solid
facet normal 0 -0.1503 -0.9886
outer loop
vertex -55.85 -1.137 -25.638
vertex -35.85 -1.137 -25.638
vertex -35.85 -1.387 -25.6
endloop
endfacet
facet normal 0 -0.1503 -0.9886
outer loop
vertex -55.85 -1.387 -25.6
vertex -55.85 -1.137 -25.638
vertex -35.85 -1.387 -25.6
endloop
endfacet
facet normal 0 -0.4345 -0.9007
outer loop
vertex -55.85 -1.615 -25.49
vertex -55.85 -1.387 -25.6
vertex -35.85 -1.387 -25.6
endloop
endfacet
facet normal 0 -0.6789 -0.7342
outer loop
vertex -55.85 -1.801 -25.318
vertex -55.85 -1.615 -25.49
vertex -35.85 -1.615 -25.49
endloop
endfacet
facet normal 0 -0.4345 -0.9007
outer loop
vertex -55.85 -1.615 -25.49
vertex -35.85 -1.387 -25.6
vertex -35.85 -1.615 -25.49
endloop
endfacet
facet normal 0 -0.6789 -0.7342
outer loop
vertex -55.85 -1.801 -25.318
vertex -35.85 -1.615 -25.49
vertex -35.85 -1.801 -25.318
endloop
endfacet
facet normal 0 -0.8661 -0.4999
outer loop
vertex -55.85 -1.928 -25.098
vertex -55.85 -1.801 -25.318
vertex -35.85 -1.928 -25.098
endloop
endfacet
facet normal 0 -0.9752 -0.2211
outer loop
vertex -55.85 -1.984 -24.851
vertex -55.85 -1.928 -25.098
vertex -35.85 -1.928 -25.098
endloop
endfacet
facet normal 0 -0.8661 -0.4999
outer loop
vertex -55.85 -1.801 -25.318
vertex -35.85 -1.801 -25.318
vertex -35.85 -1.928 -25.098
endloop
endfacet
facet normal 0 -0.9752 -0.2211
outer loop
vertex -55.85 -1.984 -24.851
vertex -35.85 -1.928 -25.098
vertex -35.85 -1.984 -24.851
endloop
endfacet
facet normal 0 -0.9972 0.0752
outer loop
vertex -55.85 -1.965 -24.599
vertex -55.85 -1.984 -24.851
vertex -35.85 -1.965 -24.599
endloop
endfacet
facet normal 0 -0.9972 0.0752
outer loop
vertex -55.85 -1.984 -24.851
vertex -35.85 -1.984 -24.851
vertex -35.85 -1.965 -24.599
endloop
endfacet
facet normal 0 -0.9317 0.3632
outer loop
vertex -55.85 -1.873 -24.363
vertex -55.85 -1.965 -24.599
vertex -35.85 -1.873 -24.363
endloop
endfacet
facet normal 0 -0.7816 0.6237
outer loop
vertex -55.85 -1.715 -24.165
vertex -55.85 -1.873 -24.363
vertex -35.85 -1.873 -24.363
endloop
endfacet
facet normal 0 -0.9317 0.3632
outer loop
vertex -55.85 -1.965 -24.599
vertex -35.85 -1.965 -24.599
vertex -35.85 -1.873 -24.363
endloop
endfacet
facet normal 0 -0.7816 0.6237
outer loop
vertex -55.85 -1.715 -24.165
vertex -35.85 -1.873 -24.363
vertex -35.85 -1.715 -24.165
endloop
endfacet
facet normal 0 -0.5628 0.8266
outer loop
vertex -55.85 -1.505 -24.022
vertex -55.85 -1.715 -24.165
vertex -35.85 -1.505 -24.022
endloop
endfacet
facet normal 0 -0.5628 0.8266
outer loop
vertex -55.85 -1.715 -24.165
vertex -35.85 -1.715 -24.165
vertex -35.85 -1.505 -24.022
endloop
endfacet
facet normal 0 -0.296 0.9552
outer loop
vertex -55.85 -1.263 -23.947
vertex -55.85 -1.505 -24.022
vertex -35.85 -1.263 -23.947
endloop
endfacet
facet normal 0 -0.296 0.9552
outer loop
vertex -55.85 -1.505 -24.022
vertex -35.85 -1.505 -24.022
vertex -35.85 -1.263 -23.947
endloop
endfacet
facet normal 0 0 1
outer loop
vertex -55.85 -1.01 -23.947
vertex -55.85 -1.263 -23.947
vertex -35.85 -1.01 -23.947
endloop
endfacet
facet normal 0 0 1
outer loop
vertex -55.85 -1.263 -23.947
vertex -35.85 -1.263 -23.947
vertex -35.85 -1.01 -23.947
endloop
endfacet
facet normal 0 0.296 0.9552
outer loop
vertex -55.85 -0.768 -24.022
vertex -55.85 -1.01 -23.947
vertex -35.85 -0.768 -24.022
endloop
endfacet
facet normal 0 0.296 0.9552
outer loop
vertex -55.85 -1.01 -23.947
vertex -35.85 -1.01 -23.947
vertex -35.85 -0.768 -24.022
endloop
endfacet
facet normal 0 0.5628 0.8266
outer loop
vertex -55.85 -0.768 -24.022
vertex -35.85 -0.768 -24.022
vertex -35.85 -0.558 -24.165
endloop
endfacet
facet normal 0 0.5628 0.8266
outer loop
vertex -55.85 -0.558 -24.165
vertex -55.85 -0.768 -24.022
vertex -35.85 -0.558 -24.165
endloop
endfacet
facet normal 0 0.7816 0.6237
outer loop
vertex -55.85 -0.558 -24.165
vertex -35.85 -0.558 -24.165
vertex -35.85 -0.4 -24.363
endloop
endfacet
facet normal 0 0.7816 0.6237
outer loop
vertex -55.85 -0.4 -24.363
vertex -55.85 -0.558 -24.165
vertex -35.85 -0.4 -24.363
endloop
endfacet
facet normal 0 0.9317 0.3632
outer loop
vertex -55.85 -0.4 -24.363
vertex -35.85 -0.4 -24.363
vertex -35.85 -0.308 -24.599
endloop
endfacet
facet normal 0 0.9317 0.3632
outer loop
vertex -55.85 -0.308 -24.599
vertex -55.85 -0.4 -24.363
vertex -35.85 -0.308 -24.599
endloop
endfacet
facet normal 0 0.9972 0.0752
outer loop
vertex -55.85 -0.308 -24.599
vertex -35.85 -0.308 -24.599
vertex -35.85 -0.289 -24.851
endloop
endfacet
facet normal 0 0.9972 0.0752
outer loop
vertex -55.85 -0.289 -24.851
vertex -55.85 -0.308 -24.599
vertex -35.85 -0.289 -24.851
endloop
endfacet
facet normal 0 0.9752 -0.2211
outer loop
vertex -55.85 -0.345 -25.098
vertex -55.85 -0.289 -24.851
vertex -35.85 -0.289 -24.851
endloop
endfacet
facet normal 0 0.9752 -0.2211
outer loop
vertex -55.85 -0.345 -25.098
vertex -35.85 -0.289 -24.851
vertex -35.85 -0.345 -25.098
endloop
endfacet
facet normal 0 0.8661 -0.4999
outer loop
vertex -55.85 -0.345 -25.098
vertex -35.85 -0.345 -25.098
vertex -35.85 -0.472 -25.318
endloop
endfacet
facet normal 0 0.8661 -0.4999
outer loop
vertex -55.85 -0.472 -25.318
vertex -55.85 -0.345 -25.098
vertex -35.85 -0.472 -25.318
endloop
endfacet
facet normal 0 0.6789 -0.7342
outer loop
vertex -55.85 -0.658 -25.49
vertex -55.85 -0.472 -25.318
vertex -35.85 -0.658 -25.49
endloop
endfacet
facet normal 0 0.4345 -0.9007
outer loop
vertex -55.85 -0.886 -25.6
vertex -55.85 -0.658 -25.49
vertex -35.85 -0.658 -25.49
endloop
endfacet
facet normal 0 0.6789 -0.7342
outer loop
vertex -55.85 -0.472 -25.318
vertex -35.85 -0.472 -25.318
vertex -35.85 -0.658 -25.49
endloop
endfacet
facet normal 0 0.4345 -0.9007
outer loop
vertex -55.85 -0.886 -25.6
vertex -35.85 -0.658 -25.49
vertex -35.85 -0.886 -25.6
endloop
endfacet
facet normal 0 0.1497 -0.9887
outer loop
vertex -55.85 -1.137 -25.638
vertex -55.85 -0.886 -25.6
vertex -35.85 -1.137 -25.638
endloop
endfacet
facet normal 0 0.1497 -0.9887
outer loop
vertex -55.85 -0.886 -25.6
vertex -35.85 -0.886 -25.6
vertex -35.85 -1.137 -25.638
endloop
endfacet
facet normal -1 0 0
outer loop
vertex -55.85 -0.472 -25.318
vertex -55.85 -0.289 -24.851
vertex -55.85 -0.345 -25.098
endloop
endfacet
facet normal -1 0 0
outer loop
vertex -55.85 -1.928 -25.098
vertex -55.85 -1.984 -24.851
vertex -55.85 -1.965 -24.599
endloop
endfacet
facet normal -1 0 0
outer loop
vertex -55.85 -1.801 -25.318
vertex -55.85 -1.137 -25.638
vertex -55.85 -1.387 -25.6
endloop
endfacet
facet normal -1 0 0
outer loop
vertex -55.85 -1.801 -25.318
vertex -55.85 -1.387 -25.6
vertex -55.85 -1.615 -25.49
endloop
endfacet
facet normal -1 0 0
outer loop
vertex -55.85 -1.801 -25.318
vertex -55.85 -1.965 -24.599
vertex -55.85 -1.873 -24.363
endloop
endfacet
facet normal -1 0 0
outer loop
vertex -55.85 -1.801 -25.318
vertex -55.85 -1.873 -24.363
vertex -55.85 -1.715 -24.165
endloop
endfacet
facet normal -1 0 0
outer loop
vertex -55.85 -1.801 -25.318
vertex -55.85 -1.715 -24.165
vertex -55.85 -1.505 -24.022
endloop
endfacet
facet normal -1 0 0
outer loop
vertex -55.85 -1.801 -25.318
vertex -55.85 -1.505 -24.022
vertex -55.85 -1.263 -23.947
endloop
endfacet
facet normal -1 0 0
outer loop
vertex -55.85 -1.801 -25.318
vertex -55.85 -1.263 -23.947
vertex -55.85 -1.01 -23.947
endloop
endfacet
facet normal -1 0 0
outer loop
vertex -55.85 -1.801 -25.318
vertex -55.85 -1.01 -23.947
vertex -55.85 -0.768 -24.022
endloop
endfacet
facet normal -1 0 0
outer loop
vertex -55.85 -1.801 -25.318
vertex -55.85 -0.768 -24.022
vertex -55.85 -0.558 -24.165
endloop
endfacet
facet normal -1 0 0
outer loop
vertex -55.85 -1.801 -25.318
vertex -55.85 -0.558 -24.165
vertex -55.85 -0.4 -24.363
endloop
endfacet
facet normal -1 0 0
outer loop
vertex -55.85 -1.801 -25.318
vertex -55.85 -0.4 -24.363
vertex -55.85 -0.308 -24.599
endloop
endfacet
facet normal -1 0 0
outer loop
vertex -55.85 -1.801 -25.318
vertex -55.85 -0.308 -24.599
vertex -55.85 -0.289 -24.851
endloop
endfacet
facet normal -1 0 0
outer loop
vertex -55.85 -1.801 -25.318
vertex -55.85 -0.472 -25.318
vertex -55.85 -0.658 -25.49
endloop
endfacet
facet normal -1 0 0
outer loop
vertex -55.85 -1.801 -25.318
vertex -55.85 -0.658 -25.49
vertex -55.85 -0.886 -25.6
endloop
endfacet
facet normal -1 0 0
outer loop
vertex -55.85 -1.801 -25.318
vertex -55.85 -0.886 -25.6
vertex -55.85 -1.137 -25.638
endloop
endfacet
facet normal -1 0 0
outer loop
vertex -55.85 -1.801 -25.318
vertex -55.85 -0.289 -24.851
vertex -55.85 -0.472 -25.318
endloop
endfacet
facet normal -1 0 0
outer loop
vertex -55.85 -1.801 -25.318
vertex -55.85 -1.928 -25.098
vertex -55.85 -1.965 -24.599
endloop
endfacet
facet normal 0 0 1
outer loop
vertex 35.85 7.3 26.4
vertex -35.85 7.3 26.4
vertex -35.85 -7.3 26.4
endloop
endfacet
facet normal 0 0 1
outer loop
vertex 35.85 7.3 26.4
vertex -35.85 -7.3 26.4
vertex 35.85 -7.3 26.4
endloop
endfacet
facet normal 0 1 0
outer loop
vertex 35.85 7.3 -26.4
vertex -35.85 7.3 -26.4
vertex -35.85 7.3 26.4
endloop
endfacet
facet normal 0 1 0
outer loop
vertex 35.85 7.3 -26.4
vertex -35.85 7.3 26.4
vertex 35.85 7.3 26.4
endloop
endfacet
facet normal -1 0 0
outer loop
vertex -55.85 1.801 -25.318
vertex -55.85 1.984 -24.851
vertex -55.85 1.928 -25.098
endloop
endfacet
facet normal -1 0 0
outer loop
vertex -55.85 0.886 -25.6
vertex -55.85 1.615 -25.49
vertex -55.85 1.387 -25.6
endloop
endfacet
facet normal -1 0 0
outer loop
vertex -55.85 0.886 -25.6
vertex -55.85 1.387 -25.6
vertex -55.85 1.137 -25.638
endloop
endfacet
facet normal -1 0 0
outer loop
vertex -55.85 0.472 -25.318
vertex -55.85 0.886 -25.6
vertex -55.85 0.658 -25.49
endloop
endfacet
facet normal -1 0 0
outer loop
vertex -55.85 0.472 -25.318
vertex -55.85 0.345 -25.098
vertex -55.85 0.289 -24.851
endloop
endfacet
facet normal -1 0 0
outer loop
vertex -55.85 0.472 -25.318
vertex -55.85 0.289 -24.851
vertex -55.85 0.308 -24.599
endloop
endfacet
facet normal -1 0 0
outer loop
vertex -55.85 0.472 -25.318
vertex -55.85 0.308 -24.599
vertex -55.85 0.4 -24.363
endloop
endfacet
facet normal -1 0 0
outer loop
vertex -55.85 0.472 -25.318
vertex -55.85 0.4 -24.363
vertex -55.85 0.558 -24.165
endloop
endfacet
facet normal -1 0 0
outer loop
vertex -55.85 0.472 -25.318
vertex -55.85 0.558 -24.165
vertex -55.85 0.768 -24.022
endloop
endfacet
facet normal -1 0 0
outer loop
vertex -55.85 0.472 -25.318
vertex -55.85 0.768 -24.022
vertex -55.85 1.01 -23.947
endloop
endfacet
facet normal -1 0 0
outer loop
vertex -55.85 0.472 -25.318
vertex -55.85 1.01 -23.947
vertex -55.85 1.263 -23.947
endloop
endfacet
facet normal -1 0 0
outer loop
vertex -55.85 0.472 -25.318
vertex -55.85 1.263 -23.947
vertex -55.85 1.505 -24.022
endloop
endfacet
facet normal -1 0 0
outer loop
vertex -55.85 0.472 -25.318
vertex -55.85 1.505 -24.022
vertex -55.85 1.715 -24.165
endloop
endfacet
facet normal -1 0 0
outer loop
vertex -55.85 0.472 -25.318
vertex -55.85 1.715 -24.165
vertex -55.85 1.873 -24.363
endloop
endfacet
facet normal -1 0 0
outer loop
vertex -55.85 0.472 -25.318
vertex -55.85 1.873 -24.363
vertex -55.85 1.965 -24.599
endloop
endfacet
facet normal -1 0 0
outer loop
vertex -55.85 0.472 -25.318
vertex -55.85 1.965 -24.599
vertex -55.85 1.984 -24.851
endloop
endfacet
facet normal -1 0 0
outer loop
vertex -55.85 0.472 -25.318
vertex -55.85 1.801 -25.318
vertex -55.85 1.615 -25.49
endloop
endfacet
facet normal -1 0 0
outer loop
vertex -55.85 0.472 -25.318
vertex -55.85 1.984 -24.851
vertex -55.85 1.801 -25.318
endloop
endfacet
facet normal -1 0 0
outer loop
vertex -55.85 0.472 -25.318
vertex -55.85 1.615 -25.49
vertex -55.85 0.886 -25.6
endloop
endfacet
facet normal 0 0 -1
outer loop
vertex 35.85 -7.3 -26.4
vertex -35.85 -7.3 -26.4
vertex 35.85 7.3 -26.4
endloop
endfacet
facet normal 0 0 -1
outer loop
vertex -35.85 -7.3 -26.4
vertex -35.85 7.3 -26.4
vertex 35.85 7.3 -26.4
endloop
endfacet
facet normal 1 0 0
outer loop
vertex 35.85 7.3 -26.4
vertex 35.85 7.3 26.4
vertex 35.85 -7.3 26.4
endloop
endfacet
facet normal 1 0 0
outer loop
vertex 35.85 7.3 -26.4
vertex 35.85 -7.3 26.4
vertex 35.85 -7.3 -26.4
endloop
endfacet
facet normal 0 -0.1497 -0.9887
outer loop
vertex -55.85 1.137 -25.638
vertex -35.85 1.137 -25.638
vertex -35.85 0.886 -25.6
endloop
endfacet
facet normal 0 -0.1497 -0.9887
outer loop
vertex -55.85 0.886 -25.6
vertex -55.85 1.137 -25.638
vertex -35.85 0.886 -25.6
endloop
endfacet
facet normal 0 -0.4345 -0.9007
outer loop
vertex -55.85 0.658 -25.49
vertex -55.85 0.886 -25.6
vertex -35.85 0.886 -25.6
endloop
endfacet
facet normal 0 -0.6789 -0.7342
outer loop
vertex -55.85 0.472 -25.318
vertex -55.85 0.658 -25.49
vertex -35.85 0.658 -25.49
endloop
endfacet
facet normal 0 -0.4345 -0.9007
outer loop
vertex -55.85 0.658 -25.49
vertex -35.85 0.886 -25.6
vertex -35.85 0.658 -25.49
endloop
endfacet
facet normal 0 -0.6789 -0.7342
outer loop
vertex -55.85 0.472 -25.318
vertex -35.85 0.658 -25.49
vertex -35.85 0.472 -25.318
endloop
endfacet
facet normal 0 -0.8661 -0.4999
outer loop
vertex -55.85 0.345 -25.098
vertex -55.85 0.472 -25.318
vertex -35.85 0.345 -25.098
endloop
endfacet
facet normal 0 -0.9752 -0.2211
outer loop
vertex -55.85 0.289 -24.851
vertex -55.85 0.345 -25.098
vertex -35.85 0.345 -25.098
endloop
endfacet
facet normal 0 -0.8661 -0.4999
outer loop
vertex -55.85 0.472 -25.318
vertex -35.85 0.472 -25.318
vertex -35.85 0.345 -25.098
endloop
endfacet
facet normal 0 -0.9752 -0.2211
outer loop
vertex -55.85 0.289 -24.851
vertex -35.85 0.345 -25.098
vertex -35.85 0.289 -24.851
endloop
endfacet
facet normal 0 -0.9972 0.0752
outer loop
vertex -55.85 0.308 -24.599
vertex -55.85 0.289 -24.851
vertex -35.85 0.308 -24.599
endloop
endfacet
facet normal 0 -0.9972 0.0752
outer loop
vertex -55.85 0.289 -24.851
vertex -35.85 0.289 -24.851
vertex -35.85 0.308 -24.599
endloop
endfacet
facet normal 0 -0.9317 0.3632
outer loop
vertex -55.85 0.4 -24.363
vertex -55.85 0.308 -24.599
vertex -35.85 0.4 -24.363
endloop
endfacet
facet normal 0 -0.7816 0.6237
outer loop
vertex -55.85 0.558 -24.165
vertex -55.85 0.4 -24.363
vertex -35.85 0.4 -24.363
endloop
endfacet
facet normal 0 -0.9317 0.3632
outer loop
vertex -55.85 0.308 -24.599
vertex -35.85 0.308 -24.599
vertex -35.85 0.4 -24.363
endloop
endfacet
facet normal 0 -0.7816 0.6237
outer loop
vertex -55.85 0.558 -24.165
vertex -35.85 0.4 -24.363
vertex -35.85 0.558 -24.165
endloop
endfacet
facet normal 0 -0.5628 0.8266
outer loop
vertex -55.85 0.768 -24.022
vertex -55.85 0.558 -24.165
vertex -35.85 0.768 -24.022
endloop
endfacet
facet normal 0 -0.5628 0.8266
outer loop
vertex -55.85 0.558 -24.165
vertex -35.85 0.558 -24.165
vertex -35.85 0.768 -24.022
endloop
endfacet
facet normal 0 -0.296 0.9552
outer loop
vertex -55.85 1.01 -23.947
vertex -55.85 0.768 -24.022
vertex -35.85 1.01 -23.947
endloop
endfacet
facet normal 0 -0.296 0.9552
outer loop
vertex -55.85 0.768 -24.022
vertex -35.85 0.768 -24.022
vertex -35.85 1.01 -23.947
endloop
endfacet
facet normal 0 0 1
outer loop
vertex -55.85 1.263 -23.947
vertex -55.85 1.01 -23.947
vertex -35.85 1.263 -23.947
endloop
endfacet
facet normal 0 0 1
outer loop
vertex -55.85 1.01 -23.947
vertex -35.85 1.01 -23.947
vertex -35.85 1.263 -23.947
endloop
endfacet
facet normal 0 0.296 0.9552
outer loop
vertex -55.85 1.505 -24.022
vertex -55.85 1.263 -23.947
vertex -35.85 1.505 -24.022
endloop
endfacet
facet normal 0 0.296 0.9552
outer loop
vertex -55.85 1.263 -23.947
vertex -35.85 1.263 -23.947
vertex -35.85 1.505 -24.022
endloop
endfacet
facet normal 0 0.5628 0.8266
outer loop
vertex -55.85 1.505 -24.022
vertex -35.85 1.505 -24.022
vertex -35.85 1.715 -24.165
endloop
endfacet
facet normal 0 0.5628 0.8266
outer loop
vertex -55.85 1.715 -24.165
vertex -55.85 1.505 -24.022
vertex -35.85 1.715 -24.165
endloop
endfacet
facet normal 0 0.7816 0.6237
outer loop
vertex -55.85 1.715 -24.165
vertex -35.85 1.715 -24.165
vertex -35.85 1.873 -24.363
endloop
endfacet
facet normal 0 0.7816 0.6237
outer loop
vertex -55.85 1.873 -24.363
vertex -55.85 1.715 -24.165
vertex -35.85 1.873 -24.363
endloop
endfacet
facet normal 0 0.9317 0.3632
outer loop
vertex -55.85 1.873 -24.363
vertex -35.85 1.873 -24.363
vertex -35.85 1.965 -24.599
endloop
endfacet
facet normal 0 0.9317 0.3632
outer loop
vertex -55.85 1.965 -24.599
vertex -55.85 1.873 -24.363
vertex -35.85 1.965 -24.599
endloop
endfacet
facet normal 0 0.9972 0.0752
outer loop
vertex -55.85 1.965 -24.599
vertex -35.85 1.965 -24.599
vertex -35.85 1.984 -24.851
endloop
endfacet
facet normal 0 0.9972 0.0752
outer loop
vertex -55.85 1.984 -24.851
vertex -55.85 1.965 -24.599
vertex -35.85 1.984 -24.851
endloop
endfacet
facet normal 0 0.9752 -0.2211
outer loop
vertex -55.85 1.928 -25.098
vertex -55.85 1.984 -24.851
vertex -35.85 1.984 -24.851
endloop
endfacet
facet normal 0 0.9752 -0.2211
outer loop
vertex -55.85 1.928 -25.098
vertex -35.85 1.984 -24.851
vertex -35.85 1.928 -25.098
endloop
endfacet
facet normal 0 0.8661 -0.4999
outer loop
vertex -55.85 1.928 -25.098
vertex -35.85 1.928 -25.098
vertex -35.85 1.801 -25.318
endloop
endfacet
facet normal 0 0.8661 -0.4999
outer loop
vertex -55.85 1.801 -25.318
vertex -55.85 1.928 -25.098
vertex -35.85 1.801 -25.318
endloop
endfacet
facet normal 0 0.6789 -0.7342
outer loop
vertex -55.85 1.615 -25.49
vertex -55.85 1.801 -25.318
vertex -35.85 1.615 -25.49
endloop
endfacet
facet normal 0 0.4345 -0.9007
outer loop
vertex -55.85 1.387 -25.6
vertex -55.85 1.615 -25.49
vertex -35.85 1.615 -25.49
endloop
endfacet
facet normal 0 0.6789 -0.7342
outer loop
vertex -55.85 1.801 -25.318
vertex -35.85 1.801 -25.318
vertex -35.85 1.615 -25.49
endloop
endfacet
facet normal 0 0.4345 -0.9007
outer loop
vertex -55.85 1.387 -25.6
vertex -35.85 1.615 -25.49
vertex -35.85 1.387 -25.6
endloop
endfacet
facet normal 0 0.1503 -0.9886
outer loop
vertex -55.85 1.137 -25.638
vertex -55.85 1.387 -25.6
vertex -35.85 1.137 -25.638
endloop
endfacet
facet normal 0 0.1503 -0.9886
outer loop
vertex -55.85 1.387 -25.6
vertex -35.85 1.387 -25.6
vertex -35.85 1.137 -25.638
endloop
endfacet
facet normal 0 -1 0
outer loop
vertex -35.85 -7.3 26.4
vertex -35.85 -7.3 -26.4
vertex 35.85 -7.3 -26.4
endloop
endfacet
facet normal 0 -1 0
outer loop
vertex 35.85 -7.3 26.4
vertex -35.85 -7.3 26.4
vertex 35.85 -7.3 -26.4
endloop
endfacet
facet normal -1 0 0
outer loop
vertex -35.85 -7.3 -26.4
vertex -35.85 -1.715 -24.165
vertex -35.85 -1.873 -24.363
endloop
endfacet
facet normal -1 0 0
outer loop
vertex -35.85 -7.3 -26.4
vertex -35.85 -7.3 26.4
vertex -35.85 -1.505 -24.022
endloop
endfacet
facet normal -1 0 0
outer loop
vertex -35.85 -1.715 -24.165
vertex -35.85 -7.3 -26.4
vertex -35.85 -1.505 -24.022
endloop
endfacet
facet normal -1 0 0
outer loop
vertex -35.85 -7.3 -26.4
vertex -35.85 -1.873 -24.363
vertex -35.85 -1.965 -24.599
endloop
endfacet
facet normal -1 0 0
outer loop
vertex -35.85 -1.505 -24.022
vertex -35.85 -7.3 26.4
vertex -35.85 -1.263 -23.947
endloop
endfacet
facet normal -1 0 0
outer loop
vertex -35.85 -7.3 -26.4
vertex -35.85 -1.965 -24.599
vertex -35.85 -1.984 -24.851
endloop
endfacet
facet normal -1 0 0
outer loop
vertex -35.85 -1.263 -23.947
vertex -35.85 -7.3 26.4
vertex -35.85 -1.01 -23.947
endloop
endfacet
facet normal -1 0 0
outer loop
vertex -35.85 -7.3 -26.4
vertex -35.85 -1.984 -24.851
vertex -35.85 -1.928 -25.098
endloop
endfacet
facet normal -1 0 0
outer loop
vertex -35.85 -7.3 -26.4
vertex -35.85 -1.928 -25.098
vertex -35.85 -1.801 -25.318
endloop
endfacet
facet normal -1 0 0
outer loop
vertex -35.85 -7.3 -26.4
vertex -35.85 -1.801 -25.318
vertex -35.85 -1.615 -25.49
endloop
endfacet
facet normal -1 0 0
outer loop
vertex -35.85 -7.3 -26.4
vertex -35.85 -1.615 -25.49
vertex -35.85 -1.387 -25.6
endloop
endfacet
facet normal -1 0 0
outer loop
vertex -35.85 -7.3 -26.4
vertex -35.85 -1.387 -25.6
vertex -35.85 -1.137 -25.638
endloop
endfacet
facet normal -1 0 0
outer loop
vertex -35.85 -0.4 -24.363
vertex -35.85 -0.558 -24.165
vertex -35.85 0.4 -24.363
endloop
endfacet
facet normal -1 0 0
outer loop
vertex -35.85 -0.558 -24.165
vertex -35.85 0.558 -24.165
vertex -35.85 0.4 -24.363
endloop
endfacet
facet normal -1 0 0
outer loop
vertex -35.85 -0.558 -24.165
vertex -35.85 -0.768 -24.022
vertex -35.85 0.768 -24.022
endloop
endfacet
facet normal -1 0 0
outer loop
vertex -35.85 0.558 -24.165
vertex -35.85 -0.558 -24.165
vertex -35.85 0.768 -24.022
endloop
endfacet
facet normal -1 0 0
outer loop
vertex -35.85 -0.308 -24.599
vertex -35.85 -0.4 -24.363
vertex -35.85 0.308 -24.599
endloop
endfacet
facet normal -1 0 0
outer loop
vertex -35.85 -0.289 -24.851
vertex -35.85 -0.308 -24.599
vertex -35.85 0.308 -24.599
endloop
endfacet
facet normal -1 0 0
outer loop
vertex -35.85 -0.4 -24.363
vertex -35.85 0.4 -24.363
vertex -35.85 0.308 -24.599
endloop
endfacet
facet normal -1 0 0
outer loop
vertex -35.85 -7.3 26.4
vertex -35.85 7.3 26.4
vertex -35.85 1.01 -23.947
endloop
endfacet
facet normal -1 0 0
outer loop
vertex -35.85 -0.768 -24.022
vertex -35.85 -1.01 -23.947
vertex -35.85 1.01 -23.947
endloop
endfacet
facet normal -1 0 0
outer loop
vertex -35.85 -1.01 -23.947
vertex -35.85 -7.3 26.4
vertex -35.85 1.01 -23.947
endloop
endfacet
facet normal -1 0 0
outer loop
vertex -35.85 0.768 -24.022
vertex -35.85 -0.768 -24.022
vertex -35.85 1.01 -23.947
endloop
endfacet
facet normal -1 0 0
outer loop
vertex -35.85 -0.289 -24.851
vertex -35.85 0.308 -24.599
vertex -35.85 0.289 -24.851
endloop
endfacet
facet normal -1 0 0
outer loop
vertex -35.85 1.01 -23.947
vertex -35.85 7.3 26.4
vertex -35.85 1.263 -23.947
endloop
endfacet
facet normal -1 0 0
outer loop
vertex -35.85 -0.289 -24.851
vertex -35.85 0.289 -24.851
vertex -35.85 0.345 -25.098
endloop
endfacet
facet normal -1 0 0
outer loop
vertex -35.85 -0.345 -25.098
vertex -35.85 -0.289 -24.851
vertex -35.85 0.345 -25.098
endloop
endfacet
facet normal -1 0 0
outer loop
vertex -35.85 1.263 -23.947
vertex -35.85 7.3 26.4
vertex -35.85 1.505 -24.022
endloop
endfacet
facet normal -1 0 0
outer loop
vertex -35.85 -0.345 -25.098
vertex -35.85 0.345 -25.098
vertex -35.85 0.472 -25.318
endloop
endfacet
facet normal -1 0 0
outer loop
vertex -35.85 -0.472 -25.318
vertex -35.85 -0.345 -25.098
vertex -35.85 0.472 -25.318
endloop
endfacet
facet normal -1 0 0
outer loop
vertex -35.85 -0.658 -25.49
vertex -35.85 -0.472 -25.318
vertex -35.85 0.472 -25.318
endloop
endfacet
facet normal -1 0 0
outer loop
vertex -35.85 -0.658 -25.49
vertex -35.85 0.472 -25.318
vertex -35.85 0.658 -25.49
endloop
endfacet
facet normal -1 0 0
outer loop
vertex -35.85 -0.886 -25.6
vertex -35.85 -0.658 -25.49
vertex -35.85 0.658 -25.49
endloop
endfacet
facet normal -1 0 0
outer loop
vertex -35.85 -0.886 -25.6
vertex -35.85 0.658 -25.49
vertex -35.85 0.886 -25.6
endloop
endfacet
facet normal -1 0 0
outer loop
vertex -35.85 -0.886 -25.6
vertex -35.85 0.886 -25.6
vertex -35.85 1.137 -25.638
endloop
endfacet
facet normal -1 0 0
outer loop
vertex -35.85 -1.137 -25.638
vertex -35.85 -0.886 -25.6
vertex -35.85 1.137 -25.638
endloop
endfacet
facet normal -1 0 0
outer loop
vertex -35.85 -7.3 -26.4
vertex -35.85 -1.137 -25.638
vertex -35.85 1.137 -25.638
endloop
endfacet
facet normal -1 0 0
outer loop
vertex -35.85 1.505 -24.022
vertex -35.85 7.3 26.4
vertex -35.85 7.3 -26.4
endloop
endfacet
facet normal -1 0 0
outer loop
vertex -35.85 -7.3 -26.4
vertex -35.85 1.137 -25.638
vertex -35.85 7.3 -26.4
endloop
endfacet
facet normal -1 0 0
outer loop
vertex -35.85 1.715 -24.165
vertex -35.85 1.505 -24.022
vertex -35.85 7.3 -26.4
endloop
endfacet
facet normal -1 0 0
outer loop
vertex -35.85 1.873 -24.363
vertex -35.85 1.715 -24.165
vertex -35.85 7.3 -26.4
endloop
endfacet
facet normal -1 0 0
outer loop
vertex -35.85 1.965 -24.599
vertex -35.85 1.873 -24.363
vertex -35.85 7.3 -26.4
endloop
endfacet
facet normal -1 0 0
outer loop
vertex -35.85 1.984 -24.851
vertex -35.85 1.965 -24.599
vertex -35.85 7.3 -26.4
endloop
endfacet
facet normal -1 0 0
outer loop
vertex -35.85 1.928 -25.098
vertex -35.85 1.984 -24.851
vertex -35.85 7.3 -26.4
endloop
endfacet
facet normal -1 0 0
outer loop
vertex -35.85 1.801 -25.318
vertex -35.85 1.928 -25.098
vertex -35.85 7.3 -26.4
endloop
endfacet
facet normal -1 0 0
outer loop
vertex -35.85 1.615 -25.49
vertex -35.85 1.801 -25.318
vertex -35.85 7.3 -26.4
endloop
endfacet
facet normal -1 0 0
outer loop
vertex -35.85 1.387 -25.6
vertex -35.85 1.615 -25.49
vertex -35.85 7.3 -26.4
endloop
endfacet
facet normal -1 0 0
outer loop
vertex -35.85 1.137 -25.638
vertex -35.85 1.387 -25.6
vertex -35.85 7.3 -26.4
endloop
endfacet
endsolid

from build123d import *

# Parameters (mm, degrees)
ESQUISSE1_W        = 71.7
ESQUISSE1_H        = 52.8
BOSS_EXTRU_1_DEPTH = 7.3
ESQUISSE2_R        = 0.85
BOSS_EXTRU_2_DEPTH = 20


with BuildPart() as part:
    # Esquisse1 → Boss.-Extru.1 (new, symmetric)
    with BuildSketch(Plane(origin=(0, 0, 0), x_dir=(1, 0, 0), z_dir=(0, 1, 0))):
        Rectangle(ESQUISSE1_W, ESQUISSE1_H)
    extrude(amount=BOSS_EXTRU_1_DEPTH, both=True)

    # Esquisse2 → Boss.-Extru.2 (add)
    with BuildSketch(Plane.ZY.offset(35.85)):
        with Locations(Location((-24.787698277, 1.136553851, 0), (0, 0, 180))):
            Circle(ESQUISSE2_R)
        with Locations(Location((-24.787698277, -1.136553851, 0), (0, 0, 180))):
            Circle(ESQUISSE2_R)
    extrude(amount=BOSS_EXTRU_2_DEPTH)


solid = part.part
